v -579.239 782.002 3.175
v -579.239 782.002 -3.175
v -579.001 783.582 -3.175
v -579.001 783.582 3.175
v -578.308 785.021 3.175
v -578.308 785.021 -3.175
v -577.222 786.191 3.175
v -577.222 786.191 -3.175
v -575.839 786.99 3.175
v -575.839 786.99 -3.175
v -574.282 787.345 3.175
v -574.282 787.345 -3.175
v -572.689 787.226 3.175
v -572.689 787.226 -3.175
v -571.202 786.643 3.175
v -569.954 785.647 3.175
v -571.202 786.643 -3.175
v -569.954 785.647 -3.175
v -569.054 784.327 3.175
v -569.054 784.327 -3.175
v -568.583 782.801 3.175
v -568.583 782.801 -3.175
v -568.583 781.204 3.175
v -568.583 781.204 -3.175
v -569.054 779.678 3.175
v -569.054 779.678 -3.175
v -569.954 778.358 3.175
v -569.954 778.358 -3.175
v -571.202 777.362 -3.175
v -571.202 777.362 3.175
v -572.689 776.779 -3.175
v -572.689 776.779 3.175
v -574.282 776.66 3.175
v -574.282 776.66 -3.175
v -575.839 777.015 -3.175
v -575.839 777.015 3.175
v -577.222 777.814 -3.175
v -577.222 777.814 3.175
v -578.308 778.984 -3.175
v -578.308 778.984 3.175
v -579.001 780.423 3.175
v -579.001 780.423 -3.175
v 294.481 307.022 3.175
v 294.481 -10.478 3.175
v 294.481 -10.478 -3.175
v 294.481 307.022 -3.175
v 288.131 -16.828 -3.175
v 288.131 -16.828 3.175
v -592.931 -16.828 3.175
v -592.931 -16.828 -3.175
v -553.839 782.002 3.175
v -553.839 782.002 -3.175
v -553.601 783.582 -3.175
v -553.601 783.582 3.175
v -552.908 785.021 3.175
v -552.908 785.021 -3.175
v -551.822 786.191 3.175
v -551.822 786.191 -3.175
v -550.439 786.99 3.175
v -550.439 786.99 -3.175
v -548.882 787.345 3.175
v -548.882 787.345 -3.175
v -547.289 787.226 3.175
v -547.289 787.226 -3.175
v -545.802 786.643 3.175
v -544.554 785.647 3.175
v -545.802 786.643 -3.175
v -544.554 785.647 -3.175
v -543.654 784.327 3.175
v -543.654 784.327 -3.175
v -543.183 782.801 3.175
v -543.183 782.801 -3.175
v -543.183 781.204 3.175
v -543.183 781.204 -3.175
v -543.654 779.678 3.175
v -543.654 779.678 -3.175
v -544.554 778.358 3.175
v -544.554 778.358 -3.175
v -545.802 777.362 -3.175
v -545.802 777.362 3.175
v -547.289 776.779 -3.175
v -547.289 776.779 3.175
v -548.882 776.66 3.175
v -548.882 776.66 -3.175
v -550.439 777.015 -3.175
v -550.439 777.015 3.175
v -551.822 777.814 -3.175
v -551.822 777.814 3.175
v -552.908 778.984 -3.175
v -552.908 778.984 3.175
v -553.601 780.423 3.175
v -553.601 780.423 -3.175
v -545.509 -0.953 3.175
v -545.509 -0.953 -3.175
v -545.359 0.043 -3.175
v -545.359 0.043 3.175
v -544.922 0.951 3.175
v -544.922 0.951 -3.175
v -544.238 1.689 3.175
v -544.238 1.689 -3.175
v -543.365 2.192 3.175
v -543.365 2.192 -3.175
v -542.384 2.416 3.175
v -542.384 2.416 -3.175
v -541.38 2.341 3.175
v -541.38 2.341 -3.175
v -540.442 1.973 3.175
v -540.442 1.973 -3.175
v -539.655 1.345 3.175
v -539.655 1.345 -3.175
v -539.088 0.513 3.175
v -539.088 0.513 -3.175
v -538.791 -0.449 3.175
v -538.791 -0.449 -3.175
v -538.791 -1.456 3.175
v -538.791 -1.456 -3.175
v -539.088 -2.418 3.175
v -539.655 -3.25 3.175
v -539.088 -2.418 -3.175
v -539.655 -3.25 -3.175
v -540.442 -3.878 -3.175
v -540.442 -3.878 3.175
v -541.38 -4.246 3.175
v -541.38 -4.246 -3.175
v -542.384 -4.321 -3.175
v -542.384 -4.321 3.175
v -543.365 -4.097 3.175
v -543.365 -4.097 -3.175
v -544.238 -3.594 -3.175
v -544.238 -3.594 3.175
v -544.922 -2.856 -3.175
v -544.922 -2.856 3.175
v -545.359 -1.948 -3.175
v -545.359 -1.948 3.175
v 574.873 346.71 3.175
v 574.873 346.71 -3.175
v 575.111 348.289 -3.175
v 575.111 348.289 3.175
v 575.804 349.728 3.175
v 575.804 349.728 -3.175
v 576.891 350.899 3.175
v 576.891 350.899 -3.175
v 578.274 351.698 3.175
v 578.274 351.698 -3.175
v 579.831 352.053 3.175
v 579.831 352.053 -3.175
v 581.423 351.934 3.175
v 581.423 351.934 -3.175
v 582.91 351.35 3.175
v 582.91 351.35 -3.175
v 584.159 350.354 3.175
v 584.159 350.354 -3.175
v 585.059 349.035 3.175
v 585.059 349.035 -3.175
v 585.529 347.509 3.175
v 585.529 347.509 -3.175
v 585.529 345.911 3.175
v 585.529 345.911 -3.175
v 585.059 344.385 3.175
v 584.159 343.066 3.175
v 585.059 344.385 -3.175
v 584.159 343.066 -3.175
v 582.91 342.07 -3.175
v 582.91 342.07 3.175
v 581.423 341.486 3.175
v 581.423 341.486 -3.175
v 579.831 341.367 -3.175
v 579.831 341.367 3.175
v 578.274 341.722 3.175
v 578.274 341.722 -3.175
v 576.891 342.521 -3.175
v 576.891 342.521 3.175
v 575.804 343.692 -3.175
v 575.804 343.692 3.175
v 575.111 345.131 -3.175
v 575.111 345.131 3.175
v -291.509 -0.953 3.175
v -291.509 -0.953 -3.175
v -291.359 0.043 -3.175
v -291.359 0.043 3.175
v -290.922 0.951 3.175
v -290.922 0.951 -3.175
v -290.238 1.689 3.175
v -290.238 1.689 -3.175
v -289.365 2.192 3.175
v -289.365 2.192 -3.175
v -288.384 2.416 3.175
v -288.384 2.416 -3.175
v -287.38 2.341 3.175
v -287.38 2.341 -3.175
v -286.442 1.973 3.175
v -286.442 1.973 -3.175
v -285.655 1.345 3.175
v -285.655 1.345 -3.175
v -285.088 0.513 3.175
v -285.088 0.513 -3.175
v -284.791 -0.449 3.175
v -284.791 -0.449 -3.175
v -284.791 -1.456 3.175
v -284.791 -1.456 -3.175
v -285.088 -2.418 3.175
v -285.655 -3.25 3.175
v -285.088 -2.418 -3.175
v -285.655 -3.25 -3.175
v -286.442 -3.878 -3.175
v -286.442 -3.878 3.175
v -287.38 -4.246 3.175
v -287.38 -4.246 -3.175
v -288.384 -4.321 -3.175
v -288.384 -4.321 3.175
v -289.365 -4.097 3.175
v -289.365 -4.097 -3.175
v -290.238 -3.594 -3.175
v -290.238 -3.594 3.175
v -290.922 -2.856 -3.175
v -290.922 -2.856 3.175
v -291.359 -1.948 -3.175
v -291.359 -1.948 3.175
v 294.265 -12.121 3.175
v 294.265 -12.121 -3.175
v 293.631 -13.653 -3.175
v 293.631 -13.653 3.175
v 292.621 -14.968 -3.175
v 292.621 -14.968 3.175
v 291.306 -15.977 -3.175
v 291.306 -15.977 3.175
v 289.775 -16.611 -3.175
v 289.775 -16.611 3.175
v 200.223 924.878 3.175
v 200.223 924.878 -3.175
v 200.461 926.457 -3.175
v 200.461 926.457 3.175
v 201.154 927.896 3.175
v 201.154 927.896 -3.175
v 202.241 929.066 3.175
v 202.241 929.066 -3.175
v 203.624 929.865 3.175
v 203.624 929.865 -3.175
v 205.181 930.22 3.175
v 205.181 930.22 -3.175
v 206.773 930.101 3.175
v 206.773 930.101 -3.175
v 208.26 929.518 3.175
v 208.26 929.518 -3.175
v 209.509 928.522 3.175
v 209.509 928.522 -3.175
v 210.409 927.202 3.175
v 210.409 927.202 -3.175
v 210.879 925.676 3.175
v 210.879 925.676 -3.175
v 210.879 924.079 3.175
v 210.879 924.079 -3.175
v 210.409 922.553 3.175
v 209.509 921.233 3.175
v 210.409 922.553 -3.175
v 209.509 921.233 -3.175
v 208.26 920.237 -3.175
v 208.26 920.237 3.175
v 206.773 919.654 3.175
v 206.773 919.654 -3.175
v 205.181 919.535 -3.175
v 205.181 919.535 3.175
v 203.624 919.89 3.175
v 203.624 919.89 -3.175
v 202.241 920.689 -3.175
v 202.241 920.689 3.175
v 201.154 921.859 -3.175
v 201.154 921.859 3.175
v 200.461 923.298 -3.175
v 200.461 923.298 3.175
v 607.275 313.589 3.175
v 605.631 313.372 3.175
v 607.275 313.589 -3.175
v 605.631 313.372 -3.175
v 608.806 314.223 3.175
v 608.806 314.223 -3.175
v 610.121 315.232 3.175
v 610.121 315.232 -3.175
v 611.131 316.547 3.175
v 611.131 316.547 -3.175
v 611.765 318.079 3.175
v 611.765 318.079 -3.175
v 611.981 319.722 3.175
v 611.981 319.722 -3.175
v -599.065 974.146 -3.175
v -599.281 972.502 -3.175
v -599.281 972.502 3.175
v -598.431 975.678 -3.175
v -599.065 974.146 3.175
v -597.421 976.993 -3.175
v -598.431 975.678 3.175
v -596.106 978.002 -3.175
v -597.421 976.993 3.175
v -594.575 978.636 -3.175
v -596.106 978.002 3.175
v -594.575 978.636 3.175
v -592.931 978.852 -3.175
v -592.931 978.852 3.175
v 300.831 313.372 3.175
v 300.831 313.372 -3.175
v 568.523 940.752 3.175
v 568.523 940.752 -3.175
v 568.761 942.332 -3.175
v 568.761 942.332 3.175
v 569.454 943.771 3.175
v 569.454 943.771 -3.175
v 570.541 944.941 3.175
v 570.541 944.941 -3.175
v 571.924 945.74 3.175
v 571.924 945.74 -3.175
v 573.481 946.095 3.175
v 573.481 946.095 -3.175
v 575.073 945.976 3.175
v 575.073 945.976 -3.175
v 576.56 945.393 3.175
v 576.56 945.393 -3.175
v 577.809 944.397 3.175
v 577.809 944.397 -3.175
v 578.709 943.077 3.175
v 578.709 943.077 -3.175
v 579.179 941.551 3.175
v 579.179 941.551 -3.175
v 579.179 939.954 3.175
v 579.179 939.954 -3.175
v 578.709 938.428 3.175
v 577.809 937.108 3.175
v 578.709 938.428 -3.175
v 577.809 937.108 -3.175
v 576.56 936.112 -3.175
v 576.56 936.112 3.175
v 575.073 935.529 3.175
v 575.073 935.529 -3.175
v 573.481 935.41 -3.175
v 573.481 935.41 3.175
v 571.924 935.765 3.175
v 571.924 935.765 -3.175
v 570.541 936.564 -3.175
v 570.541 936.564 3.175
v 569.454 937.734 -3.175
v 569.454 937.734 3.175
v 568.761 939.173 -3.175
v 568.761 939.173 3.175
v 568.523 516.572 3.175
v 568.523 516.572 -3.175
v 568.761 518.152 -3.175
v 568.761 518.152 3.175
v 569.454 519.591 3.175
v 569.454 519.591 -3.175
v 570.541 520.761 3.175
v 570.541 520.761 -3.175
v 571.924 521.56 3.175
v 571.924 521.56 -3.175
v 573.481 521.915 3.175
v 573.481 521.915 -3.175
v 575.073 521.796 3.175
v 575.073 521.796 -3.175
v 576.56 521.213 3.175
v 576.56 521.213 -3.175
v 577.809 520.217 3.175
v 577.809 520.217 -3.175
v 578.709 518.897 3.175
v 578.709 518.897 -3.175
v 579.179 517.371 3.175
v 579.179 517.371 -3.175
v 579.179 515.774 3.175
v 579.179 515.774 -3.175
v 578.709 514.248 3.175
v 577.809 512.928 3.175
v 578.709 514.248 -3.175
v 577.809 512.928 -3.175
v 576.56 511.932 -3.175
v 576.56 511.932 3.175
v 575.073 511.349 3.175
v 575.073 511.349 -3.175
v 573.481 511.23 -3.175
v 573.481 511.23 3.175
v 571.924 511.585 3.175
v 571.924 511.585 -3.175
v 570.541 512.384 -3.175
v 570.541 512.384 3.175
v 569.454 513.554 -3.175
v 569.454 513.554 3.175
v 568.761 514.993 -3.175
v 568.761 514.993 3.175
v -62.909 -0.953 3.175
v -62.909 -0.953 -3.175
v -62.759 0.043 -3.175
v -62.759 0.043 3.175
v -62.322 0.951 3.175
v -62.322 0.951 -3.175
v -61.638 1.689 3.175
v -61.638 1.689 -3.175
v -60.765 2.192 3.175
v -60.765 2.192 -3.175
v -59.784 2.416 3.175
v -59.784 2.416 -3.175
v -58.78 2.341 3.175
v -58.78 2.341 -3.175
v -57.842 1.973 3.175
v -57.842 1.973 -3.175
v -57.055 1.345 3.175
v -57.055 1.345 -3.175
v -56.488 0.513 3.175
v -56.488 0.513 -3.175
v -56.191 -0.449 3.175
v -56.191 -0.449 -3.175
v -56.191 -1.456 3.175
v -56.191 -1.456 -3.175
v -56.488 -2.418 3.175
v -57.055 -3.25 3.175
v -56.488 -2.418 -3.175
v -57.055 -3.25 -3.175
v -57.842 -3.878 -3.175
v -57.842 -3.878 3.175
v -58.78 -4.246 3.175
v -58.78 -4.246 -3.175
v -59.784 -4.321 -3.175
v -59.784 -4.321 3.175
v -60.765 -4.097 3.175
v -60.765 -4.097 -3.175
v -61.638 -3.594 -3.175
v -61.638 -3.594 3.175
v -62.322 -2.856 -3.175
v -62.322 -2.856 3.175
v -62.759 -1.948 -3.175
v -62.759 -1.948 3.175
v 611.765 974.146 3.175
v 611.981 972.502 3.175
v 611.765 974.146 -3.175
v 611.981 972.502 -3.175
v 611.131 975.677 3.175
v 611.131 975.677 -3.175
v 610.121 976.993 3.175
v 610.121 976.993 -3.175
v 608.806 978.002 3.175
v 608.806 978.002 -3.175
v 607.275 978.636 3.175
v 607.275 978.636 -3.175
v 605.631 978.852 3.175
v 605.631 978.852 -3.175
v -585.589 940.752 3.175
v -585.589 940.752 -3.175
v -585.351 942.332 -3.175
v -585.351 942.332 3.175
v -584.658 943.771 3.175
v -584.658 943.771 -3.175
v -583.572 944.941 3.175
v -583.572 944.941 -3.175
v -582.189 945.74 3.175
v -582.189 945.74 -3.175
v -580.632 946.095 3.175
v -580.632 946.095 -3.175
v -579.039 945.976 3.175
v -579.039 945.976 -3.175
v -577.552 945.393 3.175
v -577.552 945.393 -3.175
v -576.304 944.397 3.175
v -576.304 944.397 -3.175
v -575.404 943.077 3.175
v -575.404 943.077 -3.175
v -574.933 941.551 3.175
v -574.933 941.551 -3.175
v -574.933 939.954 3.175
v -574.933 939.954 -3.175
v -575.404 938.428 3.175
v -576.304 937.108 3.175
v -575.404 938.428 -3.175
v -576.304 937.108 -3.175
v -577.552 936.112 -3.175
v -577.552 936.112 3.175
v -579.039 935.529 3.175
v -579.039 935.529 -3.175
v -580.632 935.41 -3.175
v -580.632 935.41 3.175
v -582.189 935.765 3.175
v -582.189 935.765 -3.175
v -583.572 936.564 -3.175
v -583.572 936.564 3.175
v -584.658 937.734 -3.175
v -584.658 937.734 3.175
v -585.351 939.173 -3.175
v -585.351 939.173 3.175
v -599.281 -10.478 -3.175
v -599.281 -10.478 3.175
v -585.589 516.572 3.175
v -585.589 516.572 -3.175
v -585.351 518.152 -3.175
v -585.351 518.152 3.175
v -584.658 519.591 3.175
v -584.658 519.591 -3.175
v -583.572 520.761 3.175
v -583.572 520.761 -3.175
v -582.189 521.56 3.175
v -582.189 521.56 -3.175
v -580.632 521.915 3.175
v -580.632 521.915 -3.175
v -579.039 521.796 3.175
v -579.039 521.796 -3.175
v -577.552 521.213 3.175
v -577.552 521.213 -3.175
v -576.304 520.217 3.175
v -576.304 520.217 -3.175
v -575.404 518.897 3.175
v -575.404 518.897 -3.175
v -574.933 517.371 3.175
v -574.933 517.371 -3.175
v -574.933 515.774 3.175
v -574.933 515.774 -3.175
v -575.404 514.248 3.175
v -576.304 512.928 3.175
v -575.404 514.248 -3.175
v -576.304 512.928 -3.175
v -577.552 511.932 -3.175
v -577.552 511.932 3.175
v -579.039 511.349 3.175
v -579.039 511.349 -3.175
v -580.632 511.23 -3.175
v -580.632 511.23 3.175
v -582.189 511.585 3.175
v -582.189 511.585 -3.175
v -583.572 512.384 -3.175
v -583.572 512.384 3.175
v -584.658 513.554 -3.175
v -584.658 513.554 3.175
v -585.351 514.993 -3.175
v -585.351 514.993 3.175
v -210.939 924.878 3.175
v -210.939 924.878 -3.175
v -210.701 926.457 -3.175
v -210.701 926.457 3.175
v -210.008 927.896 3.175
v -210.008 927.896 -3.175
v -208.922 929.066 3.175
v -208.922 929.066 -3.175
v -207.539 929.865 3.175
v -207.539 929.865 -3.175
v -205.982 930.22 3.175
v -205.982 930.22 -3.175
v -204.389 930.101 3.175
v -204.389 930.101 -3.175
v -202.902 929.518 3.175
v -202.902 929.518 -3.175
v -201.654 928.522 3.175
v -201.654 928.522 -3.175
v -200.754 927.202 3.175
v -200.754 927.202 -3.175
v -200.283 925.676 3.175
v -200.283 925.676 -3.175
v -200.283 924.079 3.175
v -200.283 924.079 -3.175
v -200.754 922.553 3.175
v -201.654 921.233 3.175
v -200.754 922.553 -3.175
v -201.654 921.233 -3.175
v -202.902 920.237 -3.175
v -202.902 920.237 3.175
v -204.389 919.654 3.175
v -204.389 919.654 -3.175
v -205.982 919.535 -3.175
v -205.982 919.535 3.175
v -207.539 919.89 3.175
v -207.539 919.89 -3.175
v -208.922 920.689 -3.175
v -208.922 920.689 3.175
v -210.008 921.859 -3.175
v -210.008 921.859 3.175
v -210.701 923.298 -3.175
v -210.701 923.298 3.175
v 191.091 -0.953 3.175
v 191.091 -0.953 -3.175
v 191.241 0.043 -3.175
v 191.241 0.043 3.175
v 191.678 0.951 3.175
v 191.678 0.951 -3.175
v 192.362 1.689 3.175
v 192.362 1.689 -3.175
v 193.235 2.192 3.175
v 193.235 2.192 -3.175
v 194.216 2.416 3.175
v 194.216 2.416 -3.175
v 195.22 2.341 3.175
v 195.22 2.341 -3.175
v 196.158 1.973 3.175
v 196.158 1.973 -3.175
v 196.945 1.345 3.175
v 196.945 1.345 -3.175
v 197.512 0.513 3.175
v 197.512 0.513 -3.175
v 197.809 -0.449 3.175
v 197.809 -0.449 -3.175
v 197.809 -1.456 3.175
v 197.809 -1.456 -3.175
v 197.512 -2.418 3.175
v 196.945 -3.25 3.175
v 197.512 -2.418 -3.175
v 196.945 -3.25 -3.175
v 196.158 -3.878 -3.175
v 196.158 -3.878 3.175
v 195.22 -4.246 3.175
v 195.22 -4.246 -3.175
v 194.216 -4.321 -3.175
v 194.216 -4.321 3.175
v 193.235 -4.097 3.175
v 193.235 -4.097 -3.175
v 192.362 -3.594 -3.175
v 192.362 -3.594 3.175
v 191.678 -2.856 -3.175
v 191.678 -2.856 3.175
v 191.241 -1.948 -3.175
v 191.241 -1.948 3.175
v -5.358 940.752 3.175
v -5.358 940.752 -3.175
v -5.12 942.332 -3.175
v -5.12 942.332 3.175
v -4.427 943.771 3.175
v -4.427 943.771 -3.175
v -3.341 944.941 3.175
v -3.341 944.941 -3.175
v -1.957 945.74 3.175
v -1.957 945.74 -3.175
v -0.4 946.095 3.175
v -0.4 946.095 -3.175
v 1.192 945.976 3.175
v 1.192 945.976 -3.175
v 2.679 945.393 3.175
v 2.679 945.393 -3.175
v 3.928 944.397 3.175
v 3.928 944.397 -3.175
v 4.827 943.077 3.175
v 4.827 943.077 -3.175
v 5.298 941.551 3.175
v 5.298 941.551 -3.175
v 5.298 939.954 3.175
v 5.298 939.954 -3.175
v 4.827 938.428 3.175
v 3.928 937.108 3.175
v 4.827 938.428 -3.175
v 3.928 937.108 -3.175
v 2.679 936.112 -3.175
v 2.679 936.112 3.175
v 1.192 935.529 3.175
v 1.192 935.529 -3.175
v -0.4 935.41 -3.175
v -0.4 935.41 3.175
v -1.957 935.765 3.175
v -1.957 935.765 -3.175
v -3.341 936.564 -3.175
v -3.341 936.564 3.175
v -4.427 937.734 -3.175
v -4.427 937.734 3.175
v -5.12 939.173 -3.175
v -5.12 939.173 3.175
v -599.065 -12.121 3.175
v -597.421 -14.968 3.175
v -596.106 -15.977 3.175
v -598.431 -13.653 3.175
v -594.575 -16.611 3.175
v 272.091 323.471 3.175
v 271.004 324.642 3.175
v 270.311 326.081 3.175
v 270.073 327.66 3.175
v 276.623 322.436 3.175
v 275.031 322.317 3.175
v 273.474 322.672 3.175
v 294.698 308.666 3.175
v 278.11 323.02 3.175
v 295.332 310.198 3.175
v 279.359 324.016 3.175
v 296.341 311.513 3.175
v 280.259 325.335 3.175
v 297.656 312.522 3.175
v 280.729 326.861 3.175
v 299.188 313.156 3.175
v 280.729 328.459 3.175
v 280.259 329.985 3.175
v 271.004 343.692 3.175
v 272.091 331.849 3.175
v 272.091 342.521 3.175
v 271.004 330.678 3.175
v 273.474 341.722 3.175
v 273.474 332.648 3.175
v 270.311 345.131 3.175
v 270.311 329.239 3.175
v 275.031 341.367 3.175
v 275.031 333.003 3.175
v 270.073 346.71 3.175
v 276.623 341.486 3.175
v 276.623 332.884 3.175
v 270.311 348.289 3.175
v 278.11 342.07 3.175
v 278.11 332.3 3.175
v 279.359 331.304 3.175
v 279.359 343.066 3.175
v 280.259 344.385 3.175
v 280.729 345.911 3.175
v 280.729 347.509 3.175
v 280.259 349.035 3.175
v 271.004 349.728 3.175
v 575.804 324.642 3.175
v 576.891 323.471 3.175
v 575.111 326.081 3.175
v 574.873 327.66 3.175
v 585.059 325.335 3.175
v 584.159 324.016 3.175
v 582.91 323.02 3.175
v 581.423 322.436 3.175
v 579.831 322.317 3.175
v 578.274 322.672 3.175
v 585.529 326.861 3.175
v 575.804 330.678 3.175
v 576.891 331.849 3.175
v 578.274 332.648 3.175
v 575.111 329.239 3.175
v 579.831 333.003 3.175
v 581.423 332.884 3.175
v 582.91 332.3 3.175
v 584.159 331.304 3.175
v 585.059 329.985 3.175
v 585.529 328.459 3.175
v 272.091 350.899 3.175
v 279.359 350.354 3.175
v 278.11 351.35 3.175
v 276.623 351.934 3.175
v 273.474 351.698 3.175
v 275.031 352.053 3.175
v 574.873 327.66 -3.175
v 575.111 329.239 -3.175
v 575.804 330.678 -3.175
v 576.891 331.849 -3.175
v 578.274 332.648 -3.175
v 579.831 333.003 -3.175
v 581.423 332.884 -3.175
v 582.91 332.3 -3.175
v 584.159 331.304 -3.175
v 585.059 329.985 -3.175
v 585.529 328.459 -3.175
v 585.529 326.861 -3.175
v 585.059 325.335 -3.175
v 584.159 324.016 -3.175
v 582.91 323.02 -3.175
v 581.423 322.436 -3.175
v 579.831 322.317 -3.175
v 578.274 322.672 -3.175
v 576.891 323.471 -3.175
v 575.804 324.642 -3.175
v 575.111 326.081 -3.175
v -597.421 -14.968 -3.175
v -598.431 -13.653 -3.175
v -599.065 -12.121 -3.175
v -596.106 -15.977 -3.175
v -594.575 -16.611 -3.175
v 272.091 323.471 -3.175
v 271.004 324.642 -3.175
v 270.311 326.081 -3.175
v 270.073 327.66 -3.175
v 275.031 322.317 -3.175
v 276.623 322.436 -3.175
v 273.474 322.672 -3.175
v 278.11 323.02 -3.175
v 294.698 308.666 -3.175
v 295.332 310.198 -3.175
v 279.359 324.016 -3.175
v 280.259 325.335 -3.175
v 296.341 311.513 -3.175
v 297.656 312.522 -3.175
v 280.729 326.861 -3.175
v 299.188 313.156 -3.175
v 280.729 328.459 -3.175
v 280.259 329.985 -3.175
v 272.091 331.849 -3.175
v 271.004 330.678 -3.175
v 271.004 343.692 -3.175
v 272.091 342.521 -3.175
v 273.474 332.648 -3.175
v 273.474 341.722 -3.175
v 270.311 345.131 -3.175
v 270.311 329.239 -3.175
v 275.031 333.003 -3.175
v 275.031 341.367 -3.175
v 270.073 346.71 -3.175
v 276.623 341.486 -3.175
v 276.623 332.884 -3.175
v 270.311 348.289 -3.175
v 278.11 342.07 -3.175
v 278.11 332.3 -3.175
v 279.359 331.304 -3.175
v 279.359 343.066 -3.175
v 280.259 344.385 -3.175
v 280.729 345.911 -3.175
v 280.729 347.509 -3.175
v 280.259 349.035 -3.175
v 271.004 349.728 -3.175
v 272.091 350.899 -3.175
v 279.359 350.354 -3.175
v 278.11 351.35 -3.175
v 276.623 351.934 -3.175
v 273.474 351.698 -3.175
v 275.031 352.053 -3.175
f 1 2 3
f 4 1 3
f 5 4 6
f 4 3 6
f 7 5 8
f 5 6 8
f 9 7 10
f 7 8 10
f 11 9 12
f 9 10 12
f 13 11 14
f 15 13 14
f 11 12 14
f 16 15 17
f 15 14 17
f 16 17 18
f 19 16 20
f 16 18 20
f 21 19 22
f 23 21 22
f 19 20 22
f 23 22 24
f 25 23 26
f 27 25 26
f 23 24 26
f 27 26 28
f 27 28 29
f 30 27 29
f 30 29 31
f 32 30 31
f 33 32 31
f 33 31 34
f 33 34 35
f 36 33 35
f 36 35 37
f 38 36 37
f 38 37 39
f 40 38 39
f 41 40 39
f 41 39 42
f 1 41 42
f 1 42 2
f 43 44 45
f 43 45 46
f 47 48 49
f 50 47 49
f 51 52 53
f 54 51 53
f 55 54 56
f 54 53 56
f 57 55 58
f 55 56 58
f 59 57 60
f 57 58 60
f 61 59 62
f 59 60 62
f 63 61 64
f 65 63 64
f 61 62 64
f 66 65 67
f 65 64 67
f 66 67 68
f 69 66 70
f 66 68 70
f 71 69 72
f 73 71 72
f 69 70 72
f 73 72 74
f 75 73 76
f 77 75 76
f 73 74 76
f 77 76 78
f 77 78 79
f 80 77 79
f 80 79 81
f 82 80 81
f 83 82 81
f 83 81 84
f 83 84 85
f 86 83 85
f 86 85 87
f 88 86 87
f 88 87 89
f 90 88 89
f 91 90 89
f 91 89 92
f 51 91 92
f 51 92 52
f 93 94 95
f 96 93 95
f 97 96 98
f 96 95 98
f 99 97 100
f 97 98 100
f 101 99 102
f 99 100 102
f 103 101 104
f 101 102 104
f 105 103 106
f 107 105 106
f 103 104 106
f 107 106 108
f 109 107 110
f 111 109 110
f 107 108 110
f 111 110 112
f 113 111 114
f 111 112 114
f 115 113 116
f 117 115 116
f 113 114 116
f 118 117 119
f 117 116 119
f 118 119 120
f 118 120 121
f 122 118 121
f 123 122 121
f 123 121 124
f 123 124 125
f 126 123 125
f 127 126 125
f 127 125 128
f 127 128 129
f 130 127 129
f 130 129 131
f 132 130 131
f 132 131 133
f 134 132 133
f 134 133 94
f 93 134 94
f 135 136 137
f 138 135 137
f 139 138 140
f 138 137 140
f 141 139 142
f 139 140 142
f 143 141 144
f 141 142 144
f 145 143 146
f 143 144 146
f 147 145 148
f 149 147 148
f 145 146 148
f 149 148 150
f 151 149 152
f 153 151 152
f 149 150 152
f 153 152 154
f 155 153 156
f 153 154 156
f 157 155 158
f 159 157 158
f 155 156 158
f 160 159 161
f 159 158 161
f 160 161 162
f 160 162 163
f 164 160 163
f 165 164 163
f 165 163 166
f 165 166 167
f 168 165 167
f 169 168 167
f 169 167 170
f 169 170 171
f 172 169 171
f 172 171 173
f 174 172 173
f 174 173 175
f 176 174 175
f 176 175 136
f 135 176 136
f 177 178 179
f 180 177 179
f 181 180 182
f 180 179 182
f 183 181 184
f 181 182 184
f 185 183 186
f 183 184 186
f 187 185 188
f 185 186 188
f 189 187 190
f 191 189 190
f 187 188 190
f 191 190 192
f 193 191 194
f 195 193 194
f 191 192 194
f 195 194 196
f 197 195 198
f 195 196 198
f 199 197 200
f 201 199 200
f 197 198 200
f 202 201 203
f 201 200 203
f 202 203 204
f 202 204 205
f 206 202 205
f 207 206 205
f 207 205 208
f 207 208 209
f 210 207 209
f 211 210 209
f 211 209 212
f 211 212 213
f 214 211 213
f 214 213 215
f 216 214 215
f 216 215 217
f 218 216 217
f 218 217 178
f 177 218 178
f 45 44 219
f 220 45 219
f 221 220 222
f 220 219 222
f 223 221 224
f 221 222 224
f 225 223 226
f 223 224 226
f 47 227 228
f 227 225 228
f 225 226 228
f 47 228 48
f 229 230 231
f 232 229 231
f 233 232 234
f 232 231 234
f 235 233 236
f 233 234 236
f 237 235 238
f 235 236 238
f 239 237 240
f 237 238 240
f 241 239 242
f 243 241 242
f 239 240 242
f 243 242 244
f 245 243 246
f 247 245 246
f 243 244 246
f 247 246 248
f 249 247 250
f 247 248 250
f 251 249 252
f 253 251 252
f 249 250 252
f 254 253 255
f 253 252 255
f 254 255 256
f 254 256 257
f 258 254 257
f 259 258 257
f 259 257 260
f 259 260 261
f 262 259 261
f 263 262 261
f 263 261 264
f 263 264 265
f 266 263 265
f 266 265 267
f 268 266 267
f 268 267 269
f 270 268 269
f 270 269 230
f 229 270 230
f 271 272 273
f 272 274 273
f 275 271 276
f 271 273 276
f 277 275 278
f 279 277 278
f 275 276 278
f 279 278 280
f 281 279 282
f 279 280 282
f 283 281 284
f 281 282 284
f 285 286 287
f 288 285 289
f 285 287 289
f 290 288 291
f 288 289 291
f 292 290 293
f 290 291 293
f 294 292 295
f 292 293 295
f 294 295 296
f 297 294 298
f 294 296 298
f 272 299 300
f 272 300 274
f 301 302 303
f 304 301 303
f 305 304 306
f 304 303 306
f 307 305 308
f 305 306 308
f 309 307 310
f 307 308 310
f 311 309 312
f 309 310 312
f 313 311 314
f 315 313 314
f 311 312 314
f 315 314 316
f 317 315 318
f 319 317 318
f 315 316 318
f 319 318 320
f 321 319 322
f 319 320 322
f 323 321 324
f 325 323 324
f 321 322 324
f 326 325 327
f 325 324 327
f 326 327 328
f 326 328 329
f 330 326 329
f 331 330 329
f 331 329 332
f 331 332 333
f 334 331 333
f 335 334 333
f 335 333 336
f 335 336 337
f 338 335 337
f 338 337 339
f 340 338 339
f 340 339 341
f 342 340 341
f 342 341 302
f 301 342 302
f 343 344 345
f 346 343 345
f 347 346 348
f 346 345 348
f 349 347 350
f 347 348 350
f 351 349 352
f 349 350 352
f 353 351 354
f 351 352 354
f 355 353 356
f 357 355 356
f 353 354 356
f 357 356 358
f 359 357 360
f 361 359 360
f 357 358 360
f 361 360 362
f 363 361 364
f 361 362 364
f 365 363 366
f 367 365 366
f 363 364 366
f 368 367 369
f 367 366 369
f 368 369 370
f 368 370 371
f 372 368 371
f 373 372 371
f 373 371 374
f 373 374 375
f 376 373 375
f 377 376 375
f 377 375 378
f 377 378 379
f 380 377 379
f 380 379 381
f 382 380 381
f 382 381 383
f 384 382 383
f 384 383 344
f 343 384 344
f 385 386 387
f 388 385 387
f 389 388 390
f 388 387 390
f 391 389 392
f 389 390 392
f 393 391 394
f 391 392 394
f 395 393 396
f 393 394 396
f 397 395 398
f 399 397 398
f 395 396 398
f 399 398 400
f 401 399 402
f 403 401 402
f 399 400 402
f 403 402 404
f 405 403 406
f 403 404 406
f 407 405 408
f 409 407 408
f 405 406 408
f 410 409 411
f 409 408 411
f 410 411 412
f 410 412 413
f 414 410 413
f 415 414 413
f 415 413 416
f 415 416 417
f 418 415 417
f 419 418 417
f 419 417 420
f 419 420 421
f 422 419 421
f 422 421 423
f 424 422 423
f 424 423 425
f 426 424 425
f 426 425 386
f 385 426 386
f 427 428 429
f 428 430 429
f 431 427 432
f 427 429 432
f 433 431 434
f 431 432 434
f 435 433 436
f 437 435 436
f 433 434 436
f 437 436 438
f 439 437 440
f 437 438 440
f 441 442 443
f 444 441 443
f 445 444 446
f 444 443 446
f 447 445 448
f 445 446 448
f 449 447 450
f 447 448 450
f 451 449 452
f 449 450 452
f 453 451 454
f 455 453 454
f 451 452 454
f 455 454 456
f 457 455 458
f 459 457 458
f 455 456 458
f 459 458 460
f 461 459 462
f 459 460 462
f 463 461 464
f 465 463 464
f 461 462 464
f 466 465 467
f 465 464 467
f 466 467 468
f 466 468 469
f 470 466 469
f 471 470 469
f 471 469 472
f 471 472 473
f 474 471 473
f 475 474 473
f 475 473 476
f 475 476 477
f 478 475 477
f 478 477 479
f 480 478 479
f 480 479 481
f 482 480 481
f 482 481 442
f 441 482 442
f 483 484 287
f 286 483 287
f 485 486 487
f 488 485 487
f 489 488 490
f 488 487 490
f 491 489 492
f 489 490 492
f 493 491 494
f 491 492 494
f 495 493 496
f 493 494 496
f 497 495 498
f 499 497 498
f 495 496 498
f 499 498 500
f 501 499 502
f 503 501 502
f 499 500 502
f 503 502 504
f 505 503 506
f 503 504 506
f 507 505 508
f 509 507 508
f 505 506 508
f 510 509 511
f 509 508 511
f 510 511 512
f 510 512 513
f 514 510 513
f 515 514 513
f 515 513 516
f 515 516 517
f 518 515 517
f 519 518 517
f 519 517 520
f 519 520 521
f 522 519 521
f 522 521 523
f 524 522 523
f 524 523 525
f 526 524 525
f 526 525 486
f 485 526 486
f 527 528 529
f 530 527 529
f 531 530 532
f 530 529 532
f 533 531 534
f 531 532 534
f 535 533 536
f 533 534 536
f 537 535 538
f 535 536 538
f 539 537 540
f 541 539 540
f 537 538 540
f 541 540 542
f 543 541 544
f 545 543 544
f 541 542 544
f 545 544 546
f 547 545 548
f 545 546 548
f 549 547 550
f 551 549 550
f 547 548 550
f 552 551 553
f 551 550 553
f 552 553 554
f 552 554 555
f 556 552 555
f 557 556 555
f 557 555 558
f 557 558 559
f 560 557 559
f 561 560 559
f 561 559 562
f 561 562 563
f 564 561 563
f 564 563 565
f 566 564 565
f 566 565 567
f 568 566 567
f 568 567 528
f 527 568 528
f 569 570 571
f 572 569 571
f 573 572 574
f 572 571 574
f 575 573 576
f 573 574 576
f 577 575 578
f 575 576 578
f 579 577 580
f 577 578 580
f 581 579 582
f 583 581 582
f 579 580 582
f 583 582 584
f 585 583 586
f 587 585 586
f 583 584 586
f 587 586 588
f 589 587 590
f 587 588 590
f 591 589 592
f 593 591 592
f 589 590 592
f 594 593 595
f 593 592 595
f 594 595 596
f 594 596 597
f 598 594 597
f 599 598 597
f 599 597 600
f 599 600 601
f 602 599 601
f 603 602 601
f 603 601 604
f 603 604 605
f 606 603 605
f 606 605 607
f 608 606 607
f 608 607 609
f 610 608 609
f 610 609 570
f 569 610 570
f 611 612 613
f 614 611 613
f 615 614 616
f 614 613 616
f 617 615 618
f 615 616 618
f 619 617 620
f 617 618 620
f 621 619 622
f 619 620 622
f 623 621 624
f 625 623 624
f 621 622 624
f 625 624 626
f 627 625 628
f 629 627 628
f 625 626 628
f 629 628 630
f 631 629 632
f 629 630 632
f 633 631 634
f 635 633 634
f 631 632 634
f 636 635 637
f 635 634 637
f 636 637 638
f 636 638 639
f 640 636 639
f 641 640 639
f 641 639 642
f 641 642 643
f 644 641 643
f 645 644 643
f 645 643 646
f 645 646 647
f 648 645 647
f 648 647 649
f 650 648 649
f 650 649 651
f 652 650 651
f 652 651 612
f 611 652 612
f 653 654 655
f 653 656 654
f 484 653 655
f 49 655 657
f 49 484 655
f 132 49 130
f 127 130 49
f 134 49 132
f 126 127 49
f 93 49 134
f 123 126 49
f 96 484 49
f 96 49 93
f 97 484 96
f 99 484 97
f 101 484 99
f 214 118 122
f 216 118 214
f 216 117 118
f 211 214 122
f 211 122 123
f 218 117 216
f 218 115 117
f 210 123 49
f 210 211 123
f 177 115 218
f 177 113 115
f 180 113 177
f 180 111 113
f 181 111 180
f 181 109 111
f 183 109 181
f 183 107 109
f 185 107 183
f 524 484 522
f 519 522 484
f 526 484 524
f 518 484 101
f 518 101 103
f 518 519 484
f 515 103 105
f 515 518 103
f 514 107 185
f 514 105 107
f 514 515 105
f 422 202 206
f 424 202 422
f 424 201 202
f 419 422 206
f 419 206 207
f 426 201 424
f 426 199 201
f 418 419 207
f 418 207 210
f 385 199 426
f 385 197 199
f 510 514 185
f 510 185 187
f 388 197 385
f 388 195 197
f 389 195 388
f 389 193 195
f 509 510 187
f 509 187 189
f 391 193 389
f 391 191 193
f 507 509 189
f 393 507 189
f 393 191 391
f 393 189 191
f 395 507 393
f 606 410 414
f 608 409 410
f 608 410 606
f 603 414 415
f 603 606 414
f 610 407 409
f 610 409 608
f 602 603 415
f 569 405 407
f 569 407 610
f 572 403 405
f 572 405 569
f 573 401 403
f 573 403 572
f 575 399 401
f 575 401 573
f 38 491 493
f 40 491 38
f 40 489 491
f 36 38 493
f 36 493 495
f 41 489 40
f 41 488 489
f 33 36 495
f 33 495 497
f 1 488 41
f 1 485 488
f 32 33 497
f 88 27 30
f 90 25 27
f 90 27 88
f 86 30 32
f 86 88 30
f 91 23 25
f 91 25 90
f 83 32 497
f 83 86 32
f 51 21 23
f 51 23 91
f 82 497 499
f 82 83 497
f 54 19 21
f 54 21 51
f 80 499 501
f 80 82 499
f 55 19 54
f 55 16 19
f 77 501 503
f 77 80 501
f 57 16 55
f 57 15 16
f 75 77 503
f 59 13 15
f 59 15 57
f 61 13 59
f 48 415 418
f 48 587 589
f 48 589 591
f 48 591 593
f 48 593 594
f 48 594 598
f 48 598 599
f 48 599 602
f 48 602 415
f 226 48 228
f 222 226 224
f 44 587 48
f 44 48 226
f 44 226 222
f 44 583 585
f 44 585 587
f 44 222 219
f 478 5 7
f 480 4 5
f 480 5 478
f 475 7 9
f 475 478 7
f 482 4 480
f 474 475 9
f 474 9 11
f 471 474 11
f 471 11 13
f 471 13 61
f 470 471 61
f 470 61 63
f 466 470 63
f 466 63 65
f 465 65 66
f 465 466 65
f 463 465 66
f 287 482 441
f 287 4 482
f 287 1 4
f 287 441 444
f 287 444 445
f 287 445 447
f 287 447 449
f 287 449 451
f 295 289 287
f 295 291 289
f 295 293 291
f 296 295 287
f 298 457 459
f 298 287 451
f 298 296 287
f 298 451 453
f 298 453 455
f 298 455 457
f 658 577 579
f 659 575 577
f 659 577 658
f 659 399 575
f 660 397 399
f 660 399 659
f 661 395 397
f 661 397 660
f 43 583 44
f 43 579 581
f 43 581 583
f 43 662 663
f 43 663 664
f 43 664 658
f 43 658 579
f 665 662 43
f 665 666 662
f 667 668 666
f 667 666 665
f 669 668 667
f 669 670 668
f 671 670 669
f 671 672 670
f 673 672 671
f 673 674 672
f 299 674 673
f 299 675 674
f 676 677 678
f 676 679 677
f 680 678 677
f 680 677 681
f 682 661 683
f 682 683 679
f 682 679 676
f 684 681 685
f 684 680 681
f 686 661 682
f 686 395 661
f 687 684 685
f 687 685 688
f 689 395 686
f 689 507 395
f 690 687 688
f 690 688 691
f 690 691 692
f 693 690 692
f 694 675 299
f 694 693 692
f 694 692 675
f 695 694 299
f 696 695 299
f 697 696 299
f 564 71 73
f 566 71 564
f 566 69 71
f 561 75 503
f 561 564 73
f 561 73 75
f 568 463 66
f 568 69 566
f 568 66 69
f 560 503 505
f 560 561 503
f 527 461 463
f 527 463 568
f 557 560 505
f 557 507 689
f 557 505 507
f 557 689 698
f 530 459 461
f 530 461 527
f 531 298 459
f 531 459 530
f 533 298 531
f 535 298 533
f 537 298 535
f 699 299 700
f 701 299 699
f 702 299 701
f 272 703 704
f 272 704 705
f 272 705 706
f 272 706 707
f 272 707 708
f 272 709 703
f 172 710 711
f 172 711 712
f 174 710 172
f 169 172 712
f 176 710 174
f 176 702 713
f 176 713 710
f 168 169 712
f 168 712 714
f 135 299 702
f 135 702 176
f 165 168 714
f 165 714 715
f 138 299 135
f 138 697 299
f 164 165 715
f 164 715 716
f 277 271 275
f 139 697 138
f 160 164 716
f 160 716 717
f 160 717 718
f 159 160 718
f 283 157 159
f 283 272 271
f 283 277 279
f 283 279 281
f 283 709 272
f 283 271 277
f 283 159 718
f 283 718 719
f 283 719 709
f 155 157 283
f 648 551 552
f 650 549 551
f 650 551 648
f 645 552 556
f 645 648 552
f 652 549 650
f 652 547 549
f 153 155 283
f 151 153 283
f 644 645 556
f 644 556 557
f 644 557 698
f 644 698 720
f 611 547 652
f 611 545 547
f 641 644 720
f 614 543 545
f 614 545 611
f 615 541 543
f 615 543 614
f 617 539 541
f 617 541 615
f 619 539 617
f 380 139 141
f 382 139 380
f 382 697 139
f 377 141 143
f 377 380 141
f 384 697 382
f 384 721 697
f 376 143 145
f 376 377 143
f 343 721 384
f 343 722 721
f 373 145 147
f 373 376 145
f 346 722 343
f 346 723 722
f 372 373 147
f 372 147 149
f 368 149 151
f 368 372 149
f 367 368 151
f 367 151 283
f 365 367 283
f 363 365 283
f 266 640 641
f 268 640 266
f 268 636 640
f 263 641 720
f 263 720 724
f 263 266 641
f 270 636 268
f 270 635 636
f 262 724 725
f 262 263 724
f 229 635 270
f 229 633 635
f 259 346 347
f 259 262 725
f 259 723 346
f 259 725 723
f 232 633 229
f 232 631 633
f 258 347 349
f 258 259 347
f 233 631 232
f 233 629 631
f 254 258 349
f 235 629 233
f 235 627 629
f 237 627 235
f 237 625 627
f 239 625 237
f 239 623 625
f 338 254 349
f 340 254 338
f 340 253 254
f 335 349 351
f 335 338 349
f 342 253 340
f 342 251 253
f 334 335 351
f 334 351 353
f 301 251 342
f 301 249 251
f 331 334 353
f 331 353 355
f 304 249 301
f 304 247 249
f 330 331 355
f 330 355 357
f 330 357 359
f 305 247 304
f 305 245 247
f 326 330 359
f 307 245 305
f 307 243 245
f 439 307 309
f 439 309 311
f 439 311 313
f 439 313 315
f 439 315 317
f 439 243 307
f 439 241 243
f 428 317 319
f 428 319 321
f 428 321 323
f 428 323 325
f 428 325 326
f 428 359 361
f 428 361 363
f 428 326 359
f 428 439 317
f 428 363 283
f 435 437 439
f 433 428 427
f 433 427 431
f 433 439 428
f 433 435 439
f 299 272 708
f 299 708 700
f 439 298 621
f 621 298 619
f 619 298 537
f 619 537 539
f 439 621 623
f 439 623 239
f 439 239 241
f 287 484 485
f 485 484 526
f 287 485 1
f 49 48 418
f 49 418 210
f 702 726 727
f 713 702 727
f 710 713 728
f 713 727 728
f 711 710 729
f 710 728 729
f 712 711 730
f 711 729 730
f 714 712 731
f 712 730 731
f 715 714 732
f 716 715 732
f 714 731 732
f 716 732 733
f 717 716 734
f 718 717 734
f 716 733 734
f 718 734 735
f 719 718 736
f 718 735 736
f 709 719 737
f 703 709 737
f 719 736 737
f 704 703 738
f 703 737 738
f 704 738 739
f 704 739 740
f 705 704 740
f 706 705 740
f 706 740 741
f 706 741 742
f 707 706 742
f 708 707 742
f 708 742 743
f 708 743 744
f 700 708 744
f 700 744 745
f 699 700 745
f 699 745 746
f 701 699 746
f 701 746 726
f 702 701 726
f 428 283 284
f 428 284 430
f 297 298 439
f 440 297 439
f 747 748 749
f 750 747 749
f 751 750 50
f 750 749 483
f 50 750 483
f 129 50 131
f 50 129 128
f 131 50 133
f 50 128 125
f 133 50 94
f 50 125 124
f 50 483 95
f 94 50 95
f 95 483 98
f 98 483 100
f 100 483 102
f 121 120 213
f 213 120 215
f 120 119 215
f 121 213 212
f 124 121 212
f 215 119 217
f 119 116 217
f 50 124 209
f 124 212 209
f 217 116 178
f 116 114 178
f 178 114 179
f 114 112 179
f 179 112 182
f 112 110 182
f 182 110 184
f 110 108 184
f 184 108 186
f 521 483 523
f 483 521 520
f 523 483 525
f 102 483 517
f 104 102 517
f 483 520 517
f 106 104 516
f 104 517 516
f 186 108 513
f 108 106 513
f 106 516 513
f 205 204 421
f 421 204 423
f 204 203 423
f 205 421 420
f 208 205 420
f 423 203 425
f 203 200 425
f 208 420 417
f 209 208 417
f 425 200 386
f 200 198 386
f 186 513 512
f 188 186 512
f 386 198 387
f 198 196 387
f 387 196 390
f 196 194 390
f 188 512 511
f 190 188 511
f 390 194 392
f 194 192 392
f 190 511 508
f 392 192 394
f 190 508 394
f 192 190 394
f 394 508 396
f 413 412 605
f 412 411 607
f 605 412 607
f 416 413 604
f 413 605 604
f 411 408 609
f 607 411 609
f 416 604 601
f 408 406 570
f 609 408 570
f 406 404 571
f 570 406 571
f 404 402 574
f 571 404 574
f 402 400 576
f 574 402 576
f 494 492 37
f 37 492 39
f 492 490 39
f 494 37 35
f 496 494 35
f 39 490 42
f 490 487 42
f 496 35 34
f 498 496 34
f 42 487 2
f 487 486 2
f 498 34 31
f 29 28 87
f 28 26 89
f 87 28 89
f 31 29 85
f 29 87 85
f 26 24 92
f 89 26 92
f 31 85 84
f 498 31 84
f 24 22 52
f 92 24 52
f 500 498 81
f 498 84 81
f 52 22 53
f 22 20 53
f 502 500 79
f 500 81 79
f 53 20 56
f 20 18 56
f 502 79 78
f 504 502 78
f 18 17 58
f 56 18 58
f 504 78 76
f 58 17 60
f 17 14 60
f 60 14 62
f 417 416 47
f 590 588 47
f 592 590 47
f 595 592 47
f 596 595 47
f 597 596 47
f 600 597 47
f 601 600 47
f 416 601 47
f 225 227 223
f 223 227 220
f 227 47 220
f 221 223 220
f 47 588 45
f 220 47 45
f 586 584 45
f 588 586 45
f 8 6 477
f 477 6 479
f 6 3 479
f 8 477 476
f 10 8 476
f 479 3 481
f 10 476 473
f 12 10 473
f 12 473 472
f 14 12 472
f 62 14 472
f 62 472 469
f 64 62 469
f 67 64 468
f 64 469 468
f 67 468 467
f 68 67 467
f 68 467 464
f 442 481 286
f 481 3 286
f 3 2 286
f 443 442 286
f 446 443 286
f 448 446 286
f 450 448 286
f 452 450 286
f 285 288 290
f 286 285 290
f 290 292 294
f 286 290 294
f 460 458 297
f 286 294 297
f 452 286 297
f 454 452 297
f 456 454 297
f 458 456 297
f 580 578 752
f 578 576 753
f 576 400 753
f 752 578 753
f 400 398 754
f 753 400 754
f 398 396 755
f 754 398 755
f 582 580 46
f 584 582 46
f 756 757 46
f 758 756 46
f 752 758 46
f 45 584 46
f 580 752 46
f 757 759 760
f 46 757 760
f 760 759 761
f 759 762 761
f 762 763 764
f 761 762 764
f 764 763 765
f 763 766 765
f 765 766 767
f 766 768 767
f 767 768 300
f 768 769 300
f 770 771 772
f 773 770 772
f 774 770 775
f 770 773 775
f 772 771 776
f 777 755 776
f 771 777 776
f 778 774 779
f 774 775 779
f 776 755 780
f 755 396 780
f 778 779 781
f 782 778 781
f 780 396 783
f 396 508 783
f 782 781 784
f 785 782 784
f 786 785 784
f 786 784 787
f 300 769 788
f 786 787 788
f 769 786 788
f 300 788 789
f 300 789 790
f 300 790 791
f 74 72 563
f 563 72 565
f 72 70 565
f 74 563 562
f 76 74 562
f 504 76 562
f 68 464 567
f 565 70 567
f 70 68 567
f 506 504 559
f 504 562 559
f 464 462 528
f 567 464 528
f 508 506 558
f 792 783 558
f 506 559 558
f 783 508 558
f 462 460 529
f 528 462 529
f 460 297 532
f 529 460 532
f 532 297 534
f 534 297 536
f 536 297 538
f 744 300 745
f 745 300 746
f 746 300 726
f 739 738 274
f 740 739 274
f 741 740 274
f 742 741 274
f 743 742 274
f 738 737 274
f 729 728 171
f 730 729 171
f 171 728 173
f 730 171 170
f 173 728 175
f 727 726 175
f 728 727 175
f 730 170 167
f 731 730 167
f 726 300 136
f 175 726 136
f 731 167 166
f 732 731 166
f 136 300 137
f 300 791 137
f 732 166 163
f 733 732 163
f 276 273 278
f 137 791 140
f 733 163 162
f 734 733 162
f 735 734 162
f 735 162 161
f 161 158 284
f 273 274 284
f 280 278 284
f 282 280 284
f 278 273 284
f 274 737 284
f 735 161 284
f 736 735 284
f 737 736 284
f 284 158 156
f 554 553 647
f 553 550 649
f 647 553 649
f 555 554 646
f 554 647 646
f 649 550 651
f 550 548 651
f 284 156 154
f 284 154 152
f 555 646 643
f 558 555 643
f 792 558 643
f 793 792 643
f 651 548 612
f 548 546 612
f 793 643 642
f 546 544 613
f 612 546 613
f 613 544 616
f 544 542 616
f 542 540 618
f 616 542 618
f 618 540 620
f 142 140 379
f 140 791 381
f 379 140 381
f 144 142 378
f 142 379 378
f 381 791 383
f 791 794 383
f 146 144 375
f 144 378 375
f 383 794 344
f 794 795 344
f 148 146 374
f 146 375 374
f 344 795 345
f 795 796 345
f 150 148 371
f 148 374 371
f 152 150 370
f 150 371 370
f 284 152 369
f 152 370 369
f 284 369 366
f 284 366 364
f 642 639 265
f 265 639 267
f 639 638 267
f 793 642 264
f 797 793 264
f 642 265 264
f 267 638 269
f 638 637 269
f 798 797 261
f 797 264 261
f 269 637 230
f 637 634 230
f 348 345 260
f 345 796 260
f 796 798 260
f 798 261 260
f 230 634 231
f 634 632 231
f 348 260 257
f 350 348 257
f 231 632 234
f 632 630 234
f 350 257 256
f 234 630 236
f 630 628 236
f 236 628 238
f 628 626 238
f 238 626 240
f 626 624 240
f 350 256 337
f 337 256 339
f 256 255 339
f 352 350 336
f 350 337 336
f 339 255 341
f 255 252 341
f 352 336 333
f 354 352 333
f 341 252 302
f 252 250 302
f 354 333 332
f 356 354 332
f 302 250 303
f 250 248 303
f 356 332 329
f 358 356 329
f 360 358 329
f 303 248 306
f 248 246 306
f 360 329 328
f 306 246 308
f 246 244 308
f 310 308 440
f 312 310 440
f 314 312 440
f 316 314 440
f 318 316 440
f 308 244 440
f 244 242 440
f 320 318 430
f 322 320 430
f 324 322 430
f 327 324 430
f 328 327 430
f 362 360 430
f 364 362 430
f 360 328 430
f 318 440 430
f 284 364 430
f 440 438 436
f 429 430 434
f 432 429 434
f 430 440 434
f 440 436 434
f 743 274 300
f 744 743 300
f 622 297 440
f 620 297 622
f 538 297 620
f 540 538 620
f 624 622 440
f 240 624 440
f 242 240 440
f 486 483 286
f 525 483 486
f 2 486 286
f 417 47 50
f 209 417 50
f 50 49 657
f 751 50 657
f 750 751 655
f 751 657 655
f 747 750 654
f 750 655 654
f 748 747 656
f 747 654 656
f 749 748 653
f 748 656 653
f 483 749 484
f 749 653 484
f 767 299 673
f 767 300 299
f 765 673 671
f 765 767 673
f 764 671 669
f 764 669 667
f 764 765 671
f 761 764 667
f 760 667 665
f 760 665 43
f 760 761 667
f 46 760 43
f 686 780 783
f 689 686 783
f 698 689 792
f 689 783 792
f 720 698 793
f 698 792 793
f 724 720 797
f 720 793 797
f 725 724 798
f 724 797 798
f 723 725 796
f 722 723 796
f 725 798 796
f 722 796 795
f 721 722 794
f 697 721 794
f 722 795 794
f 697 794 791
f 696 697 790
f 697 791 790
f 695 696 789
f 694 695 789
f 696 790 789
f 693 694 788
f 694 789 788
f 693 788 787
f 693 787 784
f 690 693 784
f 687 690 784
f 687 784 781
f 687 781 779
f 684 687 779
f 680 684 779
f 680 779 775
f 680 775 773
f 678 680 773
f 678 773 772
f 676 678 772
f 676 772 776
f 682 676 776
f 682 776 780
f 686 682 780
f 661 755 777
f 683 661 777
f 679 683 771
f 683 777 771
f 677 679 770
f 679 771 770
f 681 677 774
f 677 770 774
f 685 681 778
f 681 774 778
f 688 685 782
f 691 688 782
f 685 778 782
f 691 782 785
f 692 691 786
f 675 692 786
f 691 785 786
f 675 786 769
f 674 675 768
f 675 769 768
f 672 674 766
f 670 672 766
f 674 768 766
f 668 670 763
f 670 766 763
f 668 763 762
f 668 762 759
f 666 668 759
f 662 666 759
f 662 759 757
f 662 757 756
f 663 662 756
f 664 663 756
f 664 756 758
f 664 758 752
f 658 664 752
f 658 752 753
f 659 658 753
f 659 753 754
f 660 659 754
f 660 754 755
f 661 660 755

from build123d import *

# Parameters (mm, degrees)
SKETCH1_W                        = 1223.9625
SKETCH1_H                        = 1976.755
BOSS_EXTRUDE1_DEPTH              = 3.175
CUT_EXTRUDE1_DEPTH               = 1163.519443002
F_1_4_CLEARANCE_HOLE1_D          = 6.7564
F_27_64_0_42188_DIAMETER_HOLE1_D = 10.715752
F_27_64_0_42188_DIAMETER_HOLE3_D = 10.715752
F_27_64_0_42188_DIAMETER_HOLE2_D = 10.715752
SKETCH9_W                        = 1223.9625
SKETCH9_H                        = 9.525
CUT_EXTRUDE2_DEPTH               = 1163.519443002
FILLET1_R                        = 6.35
FILLET2_R                        = 6.35
F_27_64_0_42188_DIAMETER_HOLE4_D = 10.715752
CUT_EXTRUDE3_DEPTH               = 1155.432150283


with BuildPart() as part:
    # Sketch1 → Boss-Extrude1 (new, symmetric)
    with BuildSketch(Plane.XY):
        Rectangle(SKETCH1_W, SKETCH1_H)
    extrude(amount=BOSS_EXTRUDE1_DEPTH, both=True)

    # Sketch2 → Cut-Extrude1 (cut, through all)
    with BuildSketch(Plane.XY.offset(3.175)):
        Polygon((294.48125, 313.3725), (611.98125, 313.3725), (611.98125, -23.1775), (611.98125, -988.3775), (-611.98125, -988.3775), (-611.98125, -23.1775), (294.48125, -23.1775), align=None)
    extrude(amount=-CUT_EXTRUDE1_DEPTH, mode=Mode.SUBTRACT)

    # 1/4 Clearance Hole1 (through all)
    with Locations(Plane.XY.offset(3.175)):
        with Locations((-542.13125, -0.9525), (-288.13125, -0.9525), (-59.53125, -0.9525), (194.46875, -0.9525)):
            Hole(F_1_4_CLEARANCE_HOLE1_D / 2)

    # 27/64 (0.42188) Diameter Hole1 (through all)
    with Locations(Plane(origin=(573.88125, 516.5725, 3.175), x_dir=(1, 0, 0), z_dir=(0, 0, 1))):
        with Locations((0, 0), (-1154.1125, 0)):
            Hole(F_27_64_0_42188_DIAMETER_HOLE1_D / 2)

    # 27/64 (0.42188) Diameter Hole3 (through all)
    with Locations(Plane(origin=(275.43125, 327.66, 3.175), x_dir=(1, 0, 0), z_dir=(0, 0, 1))):
        with Locations((0, 0), (304.8, 0), (304.8, 19.05), (0, 19.05)):
            Hole(F_27_64_0_42188_DIAMETER_HOLE3_D / 2)

    # 27/64 (0.42188) Diameter Hole2 (through all)
    with Locations(Plane.XY.offset(3.175)):
        with Locations((205.58125, 924.8775), (573.88125, 940.7525), (0, 940.7525), (-580.23125, 940.7525), (-205.58125, 924.8775)):
            Hole(F_27_64_0_42188_DIAMETER_HOLE2_D / 2)

    # Sketch9 → Cut-Extrude2 (cut, through all)
    with BuildSketch(Plane.XY.offset(3.175)):
        with Locations((0, 983.615)):
            Rectangle(SKETCH9_W, SKETCH9_H)
    extrude(amount=-CUT_EXTRUDE2_DEPTH, mode=Mode.SUBTRACT)

    # Fillet1
    fillet1_edges = [part.edges().sort_by_distance(p)[0] for p in [
        (294.48125, 313.3725, 0),
    ]]
    fillet(fillet1_edges, radius=FILLET1_R)

    # Fillet2
    fillet2_edges = [part.edges().sort_by_distance(p)[0] for p in [
        (611.98125, 978.8525, 0),
        (-611.98125, 978.8525, 0),
        (294.48125, -23.1775, 0),
        (611.98125, 313.3725, 0),
        (-611.98125, -23.1775, 0),
    ]]
    fillet(fillet2_edges, radius=FILLET2_R)

    # 27/64 (0.42188) Diameter Hole4 (through all)
    with Locations(Plane.XY.offset(3.175)):
        with Locations((-573.88125, 782.0025), (-548.48125, 782.0025)):
            Hole(F_27_64_0_42188_DIAMETER_HOLE4_D / 2)

    # Sketch12 → Cut-Extrude3 (cut, through all)
    with BuildSketch(Plane.XY.offset(3.175)):
        with BuildLine():
            Line((288.13125, -16.8275), (-592.93125, -16.8275))
            ThreePointArc((-592.93125, -16.8275), (-597.421378061, -14.967628061), (-599.28125, -10.4775))
            Line((-599.28125, -10.4775), (-599.28125, 972.5025))
            ThreePointArc((-599.28125, 972.5025), (-597.421378061, 976.992628061), (-592.93125, 978.8525))
            Line((-592.93125, 978.8525), (-605.63125, 978.8525))
            ThreePointArc((-605.63125, 978.8525), (-610.121378061, 976.992628061), (-611.98125, 972.5025))
            Line((-611.98125, 972.5025), (-611.98125, -16.8275))
            ThreePointArc((-611.98125, -16.8275), (-610.121378061, -21.317628061), (-605.63125, -23.1775))
            Line((-605.63125, -23.1775), (288.13125, -23.1775))
            ThreePointArc((288.13125, -23.1775), (292.621378061, -21.317628061), (294.48125, -16.8275))
            Line((294.48125, -16.8275), (294.48125, -10.4775))
            ThreePointArc((294.48125, -10.4775), (292.621378061, -14.967628061), (288.13125, -16.8275))
        make_face()
    extrude(amount=-CUT_EXTRUDE3_DEPTH, mode=Mode.SUBTRACT)


solid = part.part
